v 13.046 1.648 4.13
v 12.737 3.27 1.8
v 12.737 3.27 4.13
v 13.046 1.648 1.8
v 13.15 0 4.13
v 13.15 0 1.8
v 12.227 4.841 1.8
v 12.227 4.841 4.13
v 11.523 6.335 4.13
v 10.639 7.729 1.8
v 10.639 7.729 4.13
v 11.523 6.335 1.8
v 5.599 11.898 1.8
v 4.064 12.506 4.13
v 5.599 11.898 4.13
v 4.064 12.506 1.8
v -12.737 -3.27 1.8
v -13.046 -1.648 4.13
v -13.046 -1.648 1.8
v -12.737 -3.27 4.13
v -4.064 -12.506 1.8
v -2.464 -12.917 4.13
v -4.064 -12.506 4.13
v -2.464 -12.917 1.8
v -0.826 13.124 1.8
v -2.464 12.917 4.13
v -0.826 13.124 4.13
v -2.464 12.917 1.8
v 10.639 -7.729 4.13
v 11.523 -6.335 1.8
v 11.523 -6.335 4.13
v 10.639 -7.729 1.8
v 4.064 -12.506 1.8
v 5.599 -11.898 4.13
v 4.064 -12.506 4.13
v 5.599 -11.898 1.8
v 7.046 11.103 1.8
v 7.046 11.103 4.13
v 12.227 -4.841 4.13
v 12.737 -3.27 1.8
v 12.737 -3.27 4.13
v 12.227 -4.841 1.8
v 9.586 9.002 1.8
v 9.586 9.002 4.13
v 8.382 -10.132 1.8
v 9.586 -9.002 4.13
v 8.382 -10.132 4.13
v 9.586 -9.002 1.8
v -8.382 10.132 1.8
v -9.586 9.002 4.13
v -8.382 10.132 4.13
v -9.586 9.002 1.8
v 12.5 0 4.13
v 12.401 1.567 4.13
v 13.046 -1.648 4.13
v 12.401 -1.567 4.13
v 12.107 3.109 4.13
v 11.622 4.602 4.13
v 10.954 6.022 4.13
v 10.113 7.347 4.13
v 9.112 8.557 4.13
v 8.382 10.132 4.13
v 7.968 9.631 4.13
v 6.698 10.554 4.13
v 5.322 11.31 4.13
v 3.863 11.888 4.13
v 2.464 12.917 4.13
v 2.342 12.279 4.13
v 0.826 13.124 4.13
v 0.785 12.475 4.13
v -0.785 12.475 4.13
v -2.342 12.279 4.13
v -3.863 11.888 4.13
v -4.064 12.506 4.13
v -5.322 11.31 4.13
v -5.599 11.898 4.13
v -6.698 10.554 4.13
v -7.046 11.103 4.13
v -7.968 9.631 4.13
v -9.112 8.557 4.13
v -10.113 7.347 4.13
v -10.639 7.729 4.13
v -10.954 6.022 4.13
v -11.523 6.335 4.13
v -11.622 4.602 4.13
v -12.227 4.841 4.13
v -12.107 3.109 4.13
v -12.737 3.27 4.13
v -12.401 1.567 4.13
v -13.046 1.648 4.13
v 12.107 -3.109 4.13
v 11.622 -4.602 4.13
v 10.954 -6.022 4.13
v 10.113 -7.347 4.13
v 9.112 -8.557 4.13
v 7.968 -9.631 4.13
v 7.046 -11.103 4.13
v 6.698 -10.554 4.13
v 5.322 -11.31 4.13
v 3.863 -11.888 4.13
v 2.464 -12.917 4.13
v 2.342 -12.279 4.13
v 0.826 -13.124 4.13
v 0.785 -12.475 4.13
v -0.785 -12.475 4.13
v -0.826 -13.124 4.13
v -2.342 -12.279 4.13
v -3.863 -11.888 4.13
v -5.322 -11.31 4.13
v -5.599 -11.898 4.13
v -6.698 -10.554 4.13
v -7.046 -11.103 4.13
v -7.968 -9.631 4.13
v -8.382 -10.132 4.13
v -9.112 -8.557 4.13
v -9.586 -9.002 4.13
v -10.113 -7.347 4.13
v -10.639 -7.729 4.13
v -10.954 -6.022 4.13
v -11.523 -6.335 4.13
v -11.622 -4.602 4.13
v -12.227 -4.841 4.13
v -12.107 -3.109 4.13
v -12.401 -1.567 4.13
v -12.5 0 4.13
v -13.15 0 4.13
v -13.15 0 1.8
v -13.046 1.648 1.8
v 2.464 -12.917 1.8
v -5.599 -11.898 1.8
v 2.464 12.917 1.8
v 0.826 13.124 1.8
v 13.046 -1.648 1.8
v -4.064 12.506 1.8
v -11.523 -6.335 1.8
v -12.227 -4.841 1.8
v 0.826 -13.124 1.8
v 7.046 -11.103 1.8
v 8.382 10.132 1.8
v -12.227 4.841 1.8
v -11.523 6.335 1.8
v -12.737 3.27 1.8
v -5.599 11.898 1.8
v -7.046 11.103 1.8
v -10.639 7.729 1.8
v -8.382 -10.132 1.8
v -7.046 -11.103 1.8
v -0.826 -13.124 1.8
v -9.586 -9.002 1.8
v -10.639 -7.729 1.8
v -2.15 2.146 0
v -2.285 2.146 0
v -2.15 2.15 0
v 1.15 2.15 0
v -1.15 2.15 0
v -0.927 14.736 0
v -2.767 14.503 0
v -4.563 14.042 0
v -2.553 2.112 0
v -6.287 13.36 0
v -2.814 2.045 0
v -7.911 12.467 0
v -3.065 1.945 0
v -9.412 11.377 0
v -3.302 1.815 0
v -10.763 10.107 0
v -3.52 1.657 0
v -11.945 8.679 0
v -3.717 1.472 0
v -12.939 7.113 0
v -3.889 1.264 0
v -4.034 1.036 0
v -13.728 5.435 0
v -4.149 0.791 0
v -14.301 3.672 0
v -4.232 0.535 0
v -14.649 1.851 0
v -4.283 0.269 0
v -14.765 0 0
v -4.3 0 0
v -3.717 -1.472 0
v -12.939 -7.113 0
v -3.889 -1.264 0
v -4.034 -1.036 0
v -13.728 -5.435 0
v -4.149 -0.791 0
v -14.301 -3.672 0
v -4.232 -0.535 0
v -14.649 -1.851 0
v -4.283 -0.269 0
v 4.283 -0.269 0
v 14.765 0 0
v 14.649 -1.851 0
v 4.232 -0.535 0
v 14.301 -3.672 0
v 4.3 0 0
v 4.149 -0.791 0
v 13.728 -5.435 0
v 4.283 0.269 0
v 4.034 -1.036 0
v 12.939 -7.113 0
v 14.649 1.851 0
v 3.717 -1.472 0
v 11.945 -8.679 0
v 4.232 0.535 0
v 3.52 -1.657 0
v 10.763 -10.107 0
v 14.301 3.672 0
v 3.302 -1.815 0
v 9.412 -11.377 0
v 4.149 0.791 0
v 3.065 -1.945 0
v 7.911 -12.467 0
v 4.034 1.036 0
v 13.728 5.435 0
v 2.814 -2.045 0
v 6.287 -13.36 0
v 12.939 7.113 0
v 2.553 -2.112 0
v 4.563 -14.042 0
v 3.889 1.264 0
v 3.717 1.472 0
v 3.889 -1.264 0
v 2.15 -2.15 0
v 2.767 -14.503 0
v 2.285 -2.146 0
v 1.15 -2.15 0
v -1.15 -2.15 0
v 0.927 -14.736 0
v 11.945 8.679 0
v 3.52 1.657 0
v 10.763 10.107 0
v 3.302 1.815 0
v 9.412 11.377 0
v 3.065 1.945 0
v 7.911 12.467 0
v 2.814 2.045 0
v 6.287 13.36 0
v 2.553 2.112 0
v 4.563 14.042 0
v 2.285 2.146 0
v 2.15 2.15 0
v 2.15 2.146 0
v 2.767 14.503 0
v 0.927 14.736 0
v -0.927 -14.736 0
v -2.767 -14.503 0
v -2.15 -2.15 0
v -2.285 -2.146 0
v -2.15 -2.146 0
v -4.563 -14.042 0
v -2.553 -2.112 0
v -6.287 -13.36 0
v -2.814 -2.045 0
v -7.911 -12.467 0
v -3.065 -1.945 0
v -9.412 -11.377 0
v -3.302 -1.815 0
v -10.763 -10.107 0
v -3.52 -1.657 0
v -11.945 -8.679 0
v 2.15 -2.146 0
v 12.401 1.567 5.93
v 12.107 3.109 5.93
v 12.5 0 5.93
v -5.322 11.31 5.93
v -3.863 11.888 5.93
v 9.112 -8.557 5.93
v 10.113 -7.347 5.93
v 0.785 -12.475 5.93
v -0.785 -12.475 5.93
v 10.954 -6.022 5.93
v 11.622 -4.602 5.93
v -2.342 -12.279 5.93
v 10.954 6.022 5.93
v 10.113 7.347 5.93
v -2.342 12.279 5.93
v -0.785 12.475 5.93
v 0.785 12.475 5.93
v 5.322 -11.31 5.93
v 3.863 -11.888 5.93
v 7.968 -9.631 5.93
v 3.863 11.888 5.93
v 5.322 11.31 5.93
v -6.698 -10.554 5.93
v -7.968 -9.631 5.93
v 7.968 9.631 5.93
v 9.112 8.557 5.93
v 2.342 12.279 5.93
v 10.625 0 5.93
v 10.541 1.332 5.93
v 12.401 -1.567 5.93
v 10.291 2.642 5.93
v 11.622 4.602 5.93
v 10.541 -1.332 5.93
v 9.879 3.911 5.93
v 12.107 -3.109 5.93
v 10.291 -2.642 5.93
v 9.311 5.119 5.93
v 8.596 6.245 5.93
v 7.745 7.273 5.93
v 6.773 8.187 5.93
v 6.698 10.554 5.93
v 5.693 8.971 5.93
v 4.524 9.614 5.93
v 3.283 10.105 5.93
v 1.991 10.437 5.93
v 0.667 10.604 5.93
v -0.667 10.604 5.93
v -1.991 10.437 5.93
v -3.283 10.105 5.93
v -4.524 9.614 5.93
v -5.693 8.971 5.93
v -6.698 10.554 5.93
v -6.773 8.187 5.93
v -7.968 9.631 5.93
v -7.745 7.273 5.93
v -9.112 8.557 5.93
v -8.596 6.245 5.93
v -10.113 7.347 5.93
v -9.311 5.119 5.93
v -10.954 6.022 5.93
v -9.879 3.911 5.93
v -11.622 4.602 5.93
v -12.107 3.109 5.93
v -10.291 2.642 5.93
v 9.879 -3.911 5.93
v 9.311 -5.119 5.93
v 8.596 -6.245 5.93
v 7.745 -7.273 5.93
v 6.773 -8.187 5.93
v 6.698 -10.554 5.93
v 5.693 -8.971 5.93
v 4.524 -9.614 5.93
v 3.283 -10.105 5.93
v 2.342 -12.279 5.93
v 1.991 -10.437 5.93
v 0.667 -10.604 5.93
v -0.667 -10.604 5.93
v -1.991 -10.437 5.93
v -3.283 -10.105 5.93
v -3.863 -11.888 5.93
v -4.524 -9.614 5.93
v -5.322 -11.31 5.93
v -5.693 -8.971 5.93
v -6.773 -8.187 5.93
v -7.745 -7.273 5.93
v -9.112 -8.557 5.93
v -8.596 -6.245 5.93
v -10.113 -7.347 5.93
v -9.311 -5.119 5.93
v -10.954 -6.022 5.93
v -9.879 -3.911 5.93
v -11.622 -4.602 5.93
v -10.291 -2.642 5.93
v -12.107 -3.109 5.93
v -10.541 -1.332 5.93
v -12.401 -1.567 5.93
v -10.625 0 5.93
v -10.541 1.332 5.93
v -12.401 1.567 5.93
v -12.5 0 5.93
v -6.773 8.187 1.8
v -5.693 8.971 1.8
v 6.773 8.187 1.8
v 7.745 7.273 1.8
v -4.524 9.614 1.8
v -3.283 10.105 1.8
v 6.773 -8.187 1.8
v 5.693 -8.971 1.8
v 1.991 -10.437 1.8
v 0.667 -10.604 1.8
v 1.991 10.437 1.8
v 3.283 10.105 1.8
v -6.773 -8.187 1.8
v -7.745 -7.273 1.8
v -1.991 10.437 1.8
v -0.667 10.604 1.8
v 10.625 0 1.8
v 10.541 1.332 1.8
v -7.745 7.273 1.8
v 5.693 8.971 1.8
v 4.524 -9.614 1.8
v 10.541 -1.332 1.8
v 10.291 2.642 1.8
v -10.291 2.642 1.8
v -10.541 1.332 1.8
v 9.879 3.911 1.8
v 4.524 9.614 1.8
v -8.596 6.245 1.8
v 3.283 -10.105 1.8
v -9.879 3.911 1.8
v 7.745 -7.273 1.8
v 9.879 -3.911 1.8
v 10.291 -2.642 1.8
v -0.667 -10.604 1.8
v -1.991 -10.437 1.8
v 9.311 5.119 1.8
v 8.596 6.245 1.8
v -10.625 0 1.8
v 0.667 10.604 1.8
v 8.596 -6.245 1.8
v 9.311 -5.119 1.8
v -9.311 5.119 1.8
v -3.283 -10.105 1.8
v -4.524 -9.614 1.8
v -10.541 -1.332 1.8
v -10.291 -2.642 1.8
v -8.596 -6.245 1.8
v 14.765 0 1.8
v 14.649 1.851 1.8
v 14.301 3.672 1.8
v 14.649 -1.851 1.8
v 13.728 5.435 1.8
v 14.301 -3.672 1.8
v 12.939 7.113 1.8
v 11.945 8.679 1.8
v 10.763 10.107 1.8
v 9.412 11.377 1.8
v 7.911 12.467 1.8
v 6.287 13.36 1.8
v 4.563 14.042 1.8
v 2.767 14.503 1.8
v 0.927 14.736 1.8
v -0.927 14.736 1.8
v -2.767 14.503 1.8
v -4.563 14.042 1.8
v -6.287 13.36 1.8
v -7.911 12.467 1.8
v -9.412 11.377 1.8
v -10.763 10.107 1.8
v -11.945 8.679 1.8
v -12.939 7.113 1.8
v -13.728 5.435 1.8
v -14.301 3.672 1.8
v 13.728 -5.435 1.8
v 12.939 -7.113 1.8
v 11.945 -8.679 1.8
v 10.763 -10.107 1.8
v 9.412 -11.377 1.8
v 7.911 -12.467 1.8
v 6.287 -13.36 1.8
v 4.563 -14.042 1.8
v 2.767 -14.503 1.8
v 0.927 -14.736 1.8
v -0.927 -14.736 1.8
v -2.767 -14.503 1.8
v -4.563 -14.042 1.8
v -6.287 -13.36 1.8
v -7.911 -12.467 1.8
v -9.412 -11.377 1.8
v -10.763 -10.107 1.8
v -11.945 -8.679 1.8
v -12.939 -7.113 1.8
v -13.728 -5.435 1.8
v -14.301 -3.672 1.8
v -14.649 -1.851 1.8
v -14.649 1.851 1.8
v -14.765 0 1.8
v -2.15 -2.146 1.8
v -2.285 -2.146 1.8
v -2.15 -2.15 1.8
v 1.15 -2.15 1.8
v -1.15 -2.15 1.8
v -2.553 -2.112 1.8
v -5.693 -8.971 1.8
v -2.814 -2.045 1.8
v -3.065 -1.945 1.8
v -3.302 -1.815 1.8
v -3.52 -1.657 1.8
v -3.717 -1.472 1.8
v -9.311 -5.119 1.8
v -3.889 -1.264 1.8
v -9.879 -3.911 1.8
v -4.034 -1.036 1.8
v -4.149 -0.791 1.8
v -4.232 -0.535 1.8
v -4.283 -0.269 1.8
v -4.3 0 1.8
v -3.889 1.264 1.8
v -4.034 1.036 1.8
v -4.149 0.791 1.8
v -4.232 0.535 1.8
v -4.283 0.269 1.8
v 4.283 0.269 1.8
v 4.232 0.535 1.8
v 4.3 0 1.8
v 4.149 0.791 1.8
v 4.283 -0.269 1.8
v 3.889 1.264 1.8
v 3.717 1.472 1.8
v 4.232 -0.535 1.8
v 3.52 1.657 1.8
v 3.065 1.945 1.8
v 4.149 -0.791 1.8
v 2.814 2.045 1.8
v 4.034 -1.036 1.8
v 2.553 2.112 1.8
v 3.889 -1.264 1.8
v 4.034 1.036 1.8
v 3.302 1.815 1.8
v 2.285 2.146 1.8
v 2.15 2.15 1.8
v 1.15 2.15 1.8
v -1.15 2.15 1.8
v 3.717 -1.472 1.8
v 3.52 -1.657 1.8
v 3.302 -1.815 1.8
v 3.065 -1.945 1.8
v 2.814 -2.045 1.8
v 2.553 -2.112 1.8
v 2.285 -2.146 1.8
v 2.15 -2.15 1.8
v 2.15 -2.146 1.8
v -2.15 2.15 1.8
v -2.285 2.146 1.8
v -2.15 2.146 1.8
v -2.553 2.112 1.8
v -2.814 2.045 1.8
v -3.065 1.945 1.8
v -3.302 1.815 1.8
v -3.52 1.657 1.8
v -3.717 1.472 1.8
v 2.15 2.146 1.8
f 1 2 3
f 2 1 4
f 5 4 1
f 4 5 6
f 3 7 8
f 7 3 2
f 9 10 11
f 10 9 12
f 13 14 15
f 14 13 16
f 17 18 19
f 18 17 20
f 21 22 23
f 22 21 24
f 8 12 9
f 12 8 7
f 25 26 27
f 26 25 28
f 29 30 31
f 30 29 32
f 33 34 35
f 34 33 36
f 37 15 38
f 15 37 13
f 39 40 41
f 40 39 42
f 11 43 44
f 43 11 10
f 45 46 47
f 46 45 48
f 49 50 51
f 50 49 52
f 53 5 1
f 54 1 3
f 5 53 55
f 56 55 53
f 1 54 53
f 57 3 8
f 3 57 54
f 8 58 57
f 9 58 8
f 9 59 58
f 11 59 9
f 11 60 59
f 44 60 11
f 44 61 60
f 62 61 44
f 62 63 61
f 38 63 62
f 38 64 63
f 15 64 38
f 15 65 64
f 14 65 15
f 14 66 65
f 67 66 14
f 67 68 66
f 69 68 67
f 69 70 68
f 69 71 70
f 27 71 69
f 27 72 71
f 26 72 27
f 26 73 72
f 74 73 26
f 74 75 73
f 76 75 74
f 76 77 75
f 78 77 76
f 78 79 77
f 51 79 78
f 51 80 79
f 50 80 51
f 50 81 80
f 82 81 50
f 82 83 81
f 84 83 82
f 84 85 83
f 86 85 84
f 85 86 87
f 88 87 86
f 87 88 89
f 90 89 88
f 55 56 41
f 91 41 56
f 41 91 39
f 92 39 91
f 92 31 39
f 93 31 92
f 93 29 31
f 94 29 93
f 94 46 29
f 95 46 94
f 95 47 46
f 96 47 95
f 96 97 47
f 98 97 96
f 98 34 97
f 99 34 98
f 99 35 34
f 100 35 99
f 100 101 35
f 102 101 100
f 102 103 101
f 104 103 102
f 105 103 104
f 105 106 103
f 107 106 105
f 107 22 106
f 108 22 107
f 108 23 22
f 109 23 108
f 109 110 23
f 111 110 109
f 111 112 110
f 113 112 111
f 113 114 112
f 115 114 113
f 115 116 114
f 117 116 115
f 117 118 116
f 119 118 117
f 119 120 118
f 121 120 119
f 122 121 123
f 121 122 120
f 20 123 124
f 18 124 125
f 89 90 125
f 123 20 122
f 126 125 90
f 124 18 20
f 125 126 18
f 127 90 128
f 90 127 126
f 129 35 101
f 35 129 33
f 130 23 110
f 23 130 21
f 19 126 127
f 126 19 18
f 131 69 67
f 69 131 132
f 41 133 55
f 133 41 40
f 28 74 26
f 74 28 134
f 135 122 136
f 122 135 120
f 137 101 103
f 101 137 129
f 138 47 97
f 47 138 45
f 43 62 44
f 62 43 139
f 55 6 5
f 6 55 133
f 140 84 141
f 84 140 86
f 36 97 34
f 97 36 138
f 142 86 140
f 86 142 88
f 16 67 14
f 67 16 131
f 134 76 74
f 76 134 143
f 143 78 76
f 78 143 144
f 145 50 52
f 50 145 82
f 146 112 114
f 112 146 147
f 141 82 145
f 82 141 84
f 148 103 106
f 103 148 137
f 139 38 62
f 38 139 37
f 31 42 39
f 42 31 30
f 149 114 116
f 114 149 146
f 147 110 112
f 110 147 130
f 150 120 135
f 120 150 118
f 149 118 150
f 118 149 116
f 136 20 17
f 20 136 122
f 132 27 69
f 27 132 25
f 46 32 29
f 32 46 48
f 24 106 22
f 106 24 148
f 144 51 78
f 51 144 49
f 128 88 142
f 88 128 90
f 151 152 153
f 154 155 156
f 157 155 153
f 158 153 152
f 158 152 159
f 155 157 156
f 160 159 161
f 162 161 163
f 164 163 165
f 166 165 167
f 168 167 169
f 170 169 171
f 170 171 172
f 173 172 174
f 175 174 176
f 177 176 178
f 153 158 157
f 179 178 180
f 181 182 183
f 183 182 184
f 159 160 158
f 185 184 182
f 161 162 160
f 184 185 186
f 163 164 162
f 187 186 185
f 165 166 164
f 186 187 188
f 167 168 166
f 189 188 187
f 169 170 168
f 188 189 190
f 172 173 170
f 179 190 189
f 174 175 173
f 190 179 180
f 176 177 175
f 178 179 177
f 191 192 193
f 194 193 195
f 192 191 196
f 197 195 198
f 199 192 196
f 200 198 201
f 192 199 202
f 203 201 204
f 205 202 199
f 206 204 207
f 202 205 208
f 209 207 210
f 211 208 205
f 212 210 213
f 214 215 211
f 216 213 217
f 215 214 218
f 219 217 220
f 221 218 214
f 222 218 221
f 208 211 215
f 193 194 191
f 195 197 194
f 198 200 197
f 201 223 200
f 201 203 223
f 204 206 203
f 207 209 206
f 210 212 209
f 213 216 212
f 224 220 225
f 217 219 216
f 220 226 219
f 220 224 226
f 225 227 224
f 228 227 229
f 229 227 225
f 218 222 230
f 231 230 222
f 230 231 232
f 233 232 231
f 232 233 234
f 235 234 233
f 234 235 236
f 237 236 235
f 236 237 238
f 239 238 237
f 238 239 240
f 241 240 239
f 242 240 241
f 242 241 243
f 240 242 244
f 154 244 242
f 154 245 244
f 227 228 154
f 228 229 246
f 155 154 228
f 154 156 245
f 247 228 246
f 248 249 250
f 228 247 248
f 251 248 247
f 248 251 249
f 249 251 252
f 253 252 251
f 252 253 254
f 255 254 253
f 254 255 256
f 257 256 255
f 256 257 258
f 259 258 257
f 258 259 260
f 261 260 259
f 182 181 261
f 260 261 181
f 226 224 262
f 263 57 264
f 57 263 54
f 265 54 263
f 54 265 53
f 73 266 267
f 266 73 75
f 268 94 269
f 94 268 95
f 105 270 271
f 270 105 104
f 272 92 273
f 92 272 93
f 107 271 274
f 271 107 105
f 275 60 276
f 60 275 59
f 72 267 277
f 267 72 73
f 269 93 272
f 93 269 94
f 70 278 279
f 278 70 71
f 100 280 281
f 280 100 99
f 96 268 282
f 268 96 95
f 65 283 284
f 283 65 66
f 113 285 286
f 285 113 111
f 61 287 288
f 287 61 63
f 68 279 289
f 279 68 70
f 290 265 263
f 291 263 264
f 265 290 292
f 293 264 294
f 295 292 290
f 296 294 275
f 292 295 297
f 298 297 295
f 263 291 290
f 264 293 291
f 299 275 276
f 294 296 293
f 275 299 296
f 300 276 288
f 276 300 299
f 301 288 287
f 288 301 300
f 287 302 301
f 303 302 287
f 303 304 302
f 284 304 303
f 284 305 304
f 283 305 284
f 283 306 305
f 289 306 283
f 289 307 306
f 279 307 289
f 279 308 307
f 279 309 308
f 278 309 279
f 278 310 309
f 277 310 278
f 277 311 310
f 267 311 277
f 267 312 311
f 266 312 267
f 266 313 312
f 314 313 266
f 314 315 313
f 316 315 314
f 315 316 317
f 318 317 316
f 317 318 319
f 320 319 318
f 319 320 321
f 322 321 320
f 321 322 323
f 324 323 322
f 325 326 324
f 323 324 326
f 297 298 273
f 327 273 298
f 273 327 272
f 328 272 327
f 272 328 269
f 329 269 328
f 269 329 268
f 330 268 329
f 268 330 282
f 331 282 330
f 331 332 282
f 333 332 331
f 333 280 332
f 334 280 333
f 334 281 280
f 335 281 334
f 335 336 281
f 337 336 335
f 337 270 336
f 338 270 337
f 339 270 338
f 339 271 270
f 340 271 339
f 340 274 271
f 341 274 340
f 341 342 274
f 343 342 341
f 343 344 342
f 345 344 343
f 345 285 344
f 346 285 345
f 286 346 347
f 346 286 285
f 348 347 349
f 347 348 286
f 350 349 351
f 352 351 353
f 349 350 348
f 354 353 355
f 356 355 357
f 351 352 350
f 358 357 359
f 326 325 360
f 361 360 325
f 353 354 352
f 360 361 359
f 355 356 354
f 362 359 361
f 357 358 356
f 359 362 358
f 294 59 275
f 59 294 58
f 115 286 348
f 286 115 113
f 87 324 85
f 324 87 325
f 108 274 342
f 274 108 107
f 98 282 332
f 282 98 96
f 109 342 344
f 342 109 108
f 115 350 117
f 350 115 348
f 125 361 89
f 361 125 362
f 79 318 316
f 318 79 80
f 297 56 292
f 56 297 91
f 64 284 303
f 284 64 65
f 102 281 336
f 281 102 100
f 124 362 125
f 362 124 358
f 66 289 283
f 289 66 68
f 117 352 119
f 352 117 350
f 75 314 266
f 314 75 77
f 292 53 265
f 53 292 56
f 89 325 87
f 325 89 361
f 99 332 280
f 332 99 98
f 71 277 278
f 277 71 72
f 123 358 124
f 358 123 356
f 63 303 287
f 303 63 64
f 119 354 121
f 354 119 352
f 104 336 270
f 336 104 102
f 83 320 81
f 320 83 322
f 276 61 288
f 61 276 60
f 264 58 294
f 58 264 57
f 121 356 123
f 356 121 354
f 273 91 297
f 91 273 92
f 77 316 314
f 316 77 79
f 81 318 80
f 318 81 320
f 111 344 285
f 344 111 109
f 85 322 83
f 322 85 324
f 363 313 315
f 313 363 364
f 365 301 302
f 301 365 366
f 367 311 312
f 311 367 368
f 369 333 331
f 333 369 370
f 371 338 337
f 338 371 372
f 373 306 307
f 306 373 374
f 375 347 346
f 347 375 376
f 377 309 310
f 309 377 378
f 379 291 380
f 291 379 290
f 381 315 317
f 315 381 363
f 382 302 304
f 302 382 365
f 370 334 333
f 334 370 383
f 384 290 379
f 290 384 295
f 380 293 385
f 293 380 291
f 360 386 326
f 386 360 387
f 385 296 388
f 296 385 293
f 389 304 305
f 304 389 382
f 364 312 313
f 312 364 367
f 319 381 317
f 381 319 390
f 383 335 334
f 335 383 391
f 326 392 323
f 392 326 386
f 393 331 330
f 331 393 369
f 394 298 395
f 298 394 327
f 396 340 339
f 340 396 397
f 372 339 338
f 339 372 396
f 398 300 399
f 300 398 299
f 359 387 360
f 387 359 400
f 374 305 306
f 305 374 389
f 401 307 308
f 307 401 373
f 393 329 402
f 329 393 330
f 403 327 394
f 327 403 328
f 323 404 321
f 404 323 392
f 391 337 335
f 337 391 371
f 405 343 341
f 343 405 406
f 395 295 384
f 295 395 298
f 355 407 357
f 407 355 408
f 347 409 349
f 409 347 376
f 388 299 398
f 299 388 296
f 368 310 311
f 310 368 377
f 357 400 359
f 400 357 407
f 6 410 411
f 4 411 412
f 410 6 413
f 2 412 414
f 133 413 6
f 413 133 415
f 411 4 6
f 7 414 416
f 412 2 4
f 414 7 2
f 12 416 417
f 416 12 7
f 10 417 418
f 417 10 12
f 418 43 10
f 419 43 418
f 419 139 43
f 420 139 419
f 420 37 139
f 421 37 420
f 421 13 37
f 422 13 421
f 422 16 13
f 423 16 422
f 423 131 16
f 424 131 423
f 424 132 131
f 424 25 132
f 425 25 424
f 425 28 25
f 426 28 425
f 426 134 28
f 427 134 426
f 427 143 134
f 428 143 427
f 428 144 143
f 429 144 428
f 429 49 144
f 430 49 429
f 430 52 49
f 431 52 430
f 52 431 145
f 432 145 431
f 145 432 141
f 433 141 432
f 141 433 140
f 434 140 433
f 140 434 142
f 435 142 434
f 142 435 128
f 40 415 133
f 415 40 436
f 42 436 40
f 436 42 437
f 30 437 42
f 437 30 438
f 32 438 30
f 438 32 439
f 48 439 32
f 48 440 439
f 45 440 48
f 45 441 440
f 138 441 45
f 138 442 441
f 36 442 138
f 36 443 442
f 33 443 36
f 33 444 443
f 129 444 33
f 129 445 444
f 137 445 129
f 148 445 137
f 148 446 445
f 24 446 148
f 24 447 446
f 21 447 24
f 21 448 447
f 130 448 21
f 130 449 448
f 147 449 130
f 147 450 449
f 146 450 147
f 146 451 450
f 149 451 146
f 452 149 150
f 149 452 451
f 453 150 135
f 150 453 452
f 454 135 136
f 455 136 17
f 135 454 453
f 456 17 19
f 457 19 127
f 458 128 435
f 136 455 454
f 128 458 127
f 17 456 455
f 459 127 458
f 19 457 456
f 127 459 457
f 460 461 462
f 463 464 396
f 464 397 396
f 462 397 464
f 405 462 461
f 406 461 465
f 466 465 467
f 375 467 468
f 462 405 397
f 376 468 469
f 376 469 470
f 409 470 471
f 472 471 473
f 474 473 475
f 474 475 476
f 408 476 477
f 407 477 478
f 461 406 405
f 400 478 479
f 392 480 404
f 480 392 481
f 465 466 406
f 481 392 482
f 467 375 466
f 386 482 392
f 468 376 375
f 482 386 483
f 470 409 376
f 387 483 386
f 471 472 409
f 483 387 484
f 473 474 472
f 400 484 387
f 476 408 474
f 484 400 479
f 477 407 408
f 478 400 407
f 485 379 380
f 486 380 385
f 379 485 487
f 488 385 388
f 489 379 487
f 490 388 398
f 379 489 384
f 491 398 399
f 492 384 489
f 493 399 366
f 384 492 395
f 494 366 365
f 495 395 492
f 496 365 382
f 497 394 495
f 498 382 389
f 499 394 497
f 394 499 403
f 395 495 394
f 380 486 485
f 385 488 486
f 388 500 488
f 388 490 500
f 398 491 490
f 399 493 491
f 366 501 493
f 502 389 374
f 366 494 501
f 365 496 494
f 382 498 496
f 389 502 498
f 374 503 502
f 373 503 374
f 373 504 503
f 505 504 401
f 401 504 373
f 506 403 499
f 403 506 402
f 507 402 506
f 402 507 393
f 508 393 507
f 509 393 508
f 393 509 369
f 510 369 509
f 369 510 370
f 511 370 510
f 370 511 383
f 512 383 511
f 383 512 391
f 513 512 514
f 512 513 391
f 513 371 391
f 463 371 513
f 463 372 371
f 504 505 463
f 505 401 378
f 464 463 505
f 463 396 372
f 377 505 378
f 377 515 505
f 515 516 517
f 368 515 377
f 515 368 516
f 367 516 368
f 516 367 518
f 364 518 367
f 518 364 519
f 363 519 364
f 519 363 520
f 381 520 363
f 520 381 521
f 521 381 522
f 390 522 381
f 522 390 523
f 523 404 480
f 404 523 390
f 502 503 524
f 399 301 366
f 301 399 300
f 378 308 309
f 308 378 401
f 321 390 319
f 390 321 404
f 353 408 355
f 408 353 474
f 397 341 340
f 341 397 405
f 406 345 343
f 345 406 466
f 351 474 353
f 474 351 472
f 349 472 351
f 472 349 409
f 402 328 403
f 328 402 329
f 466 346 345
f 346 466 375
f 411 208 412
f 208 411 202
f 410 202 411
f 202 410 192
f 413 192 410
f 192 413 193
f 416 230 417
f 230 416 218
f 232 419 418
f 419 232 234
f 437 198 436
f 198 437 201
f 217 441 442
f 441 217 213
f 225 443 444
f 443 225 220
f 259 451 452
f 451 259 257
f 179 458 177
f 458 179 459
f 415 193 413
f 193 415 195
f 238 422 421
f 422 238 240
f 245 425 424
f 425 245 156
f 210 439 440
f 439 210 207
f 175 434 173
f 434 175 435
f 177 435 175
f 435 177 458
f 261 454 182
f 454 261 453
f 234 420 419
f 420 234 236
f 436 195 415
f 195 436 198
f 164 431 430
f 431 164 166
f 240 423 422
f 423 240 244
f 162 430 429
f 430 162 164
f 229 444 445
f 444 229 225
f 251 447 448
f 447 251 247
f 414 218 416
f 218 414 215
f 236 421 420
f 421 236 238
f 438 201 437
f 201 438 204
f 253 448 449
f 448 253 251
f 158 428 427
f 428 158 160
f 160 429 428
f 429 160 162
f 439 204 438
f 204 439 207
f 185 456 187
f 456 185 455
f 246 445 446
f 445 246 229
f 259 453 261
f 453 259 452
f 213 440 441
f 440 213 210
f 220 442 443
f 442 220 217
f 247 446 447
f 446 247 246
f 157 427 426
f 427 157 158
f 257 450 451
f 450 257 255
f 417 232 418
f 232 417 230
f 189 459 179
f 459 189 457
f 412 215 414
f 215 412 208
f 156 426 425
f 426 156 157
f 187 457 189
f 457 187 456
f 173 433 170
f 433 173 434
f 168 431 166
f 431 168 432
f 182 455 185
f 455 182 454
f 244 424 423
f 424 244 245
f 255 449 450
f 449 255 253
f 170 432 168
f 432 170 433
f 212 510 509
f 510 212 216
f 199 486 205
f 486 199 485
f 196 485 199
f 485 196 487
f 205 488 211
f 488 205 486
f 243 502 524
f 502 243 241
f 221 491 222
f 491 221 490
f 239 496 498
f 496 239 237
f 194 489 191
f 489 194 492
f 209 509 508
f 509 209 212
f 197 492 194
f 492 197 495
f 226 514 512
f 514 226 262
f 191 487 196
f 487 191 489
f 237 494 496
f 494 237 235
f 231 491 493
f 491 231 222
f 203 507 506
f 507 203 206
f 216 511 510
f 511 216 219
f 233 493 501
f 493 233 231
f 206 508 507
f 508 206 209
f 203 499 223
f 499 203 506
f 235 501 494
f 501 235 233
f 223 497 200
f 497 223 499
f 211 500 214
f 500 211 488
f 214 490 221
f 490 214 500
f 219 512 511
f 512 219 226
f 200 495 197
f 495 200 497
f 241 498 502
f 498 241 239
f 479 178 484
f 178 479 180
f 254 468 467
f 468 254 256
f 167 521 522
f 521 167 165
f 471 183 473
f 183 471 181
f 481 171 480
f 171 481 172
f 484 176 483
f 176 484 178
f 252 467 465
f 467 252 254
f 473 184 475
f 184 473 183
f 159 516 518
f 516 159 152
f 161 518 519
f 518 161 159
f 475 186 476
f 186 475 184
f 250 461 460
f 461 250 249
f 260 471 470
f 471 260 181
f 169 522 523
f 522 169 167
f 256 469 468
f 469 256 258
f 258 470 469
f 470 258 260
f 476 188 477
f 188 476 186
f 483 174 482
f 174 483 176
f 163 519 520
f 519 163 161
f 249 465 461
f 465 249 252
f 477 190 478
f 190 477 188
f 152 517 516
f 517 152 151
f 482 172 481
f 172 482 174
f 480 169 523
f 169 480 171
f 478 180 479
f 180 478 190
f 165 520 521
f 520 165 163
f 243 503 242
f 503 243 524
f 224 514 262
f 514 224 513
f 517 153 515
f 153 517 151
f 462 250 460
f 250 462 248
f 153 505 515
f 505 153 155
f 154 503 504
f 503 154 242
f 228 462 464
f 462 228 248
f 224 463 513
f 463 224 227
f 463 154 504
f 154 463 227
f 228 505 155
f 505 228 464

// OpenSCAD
h1 = 5.93;
w1 = 25;
h2 = 4.13;
w2 = 26.3;
h3 = 1.8;
w3 = 29.53;
iw = 21.25;

split = 4.3; // distance between cutouts
cutoutd = 4.3; // diameter of cutout

$fn = 50;
difference(){
	union(){
		cylinder(h3, w3 / 2, w3 / 2);
		difference(){
			union(){
				cylinder(h2, w2 / 2, w2 / 2);
				cylinder(h1, w1 / 2, w1 / 2);
			}
			translate([0, 0, h3]){
				cylinder(h1, iw / 2, iw / 2);
			}
		}
	}
	difference(){
		union(){
			for(m = [0:1]){
				mirror([m, 0, 0]){
					translate([split / 2, 0, 0]){
						cylinder(h3, cutoutd / 2, cutoutd / 2);
					}
				}
			}
			translate([-split / 2, -cutoutd / 2, 0]){
				cube([split, cutoutd, h3]);
			}
		}
		translate([-split / 2 + 1, -cutoutd / 2, 0]){
			cube([split - 2, cutoutd, h3]);
		}
	}
}
